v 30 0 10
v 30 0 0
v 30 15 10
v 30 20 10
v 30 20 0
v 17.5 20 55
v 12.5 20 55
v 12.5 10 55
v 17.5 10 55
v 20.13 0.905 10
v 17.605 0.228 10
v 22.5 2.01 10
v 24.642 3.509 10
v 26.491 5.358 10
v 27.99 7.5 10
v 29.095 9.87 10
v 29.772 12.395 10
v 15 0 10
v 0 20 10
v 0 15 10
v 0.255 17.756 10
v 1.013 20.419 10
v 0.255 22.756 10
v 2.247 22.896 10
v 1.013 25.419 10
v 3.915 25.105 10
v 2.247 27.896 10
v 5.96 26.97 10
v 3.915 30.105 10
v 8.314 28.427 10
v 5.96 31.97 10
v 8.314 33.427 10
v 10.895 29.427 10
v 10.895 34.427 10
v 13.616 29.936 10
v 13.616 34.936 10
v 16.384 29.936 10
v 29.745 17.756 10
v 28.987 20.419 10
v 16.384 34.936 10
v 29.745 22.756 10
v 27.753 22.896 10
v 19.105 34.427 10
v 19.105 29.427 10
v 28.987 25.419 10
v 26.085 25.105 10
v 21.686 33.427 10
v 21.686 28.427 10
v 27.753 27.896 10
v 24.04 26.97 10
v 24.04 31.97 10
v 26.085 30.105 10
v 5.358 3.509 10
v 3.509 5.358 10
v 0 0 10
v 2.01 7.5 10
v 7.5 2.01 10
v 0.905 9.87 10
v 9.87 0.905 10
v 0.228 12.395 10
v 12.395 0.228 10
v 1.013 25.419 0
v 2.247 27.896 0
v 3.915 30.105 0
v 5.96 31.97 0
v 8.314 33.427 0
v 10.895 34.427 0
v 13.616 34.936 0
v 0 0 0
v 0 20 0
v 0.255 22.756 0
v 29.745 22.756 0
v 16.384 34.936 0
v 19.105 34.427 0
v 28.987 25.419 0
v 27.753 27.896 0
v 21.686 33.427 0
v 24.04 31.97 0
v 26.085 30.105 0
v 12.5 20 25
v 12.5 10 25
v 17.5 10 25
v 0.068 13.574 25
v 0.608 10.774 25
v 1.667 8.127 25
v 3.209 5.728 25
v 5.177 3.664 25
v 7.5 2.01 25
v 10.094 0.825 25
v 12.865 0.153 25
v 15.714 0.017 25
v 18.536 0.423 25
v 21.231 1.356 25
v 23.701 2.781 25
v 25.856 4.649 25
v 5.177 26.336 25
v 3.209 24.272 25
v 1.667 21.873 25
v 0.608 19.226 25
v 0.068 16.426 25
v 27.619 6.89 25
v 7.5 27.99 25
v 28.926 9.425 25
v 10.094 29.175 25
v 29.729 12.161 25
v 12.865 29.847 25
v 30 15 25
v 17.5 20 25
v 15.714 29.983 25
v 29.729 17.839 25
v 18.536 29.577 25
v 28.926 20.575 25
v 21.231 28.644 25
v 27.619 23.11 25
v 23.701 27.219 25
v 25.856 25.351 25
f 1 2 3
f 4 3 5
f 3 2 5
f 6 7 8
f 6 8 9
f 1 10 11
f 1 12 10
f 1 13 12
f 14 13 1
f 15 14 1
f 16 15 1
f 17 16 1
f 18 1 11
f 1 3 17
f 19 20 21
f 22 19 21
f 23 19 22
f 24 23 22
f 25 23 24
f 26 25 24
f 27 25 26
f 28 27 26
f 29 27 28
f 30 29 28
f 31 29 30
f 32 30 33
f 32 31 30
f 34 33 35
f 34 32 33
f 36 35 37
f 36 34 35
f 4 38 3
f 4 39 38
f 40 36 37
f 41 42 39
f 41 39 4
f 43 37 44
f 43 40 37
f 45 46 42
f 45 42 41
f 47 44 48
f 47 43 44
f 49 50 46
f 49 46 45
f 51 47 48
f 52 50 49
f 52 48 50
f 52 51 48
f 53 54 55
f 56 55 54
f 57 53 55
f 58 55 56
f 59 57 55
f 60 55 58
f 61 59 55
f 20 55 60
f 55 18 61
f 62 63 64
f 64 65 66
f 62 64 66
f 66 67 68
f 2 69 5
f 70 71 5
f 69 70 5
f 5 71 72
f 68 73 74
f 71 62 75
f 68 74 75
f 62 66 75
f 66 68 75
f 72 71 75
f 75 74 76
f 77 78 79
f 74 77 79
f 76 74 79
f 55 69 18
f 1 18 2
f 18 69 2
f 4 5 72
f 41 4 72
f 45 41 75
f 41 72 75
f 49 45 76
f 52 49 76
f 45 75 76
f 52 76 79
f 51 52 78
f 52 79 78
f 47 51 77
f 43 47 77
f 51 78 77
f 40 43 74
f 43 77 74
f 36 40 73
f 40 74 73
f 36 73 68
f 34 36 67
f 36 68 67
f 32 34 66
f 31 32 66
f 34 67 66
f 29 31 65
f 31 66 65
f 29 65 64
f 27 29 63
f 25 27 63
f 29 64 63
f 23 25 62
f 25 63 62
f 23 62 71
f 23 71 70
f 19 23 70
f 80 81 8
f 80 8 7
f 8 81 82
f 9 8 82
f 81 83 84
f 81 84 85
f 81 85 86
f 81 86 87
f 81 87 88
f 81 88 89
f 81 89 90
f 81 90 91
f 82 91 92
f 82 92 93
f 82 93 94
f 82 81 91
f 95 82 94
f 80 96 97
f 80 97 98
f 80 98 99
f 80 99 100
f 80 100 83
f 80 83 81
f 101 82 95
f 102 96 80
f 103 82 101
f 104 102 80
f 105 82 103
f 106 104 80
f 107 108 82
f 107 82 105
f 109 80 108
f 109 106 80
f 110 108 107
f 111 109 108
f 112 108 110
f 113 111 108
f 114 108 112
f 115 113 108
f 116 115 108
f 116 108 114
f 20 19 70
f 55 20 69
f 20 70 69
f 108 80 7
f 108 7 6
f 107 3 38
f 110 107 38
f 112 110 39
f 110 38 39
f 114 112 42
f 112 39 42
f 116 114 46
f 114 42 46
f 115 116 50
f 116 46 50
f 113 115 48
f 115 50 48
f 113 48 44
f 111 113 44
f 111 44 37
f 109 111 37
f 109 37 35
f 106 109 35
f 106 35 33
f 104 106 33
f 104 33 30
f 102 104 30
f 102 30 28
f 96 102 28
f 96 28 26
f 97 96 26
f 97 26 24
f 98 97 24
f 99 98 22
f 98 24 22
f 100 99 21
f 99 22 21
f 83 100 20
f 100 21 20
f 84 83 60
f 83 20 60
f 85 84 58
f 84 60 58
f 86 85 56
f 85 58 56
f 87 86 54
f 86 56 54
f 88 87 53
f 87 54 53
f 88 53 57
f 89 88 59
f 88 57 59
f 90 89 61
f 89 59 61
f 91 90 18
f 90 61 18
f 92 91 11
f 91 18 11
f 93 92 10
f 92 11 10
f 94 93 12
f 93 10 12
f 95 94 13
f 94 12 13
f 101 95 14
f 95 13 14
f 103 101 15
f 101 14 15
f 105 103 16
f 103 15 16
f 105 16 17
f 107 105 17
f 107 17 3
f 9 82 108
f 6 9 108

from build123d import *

# Parameters (mm, degrees)
EXTRUDE_1_DEPTH = 10
SKETCH_2_R      = 15
EXTRUDE_2_DEPTH = 15
SKETCH_3_W      = 5
SKETCH_3_H      = 10
EXTRUDE_3_DEPTH = 30


with BuildPart() as part:
    # ｽｹｯﾁ1 → ﾎﾞｽ - 押し出し1 (new body)
    with BuildSketch(Plane.XY):
        with BuildLine():
            Line((0, 0), (30, 0))
            Line((30, 0), (30, 20))
            ThreePointArc((30, 20), (15, 35), (0, 20))
            Line((0, 20), (0, 0))
        make_face()
    extrude(amount=EXTRUDE_1_DEPTH)

    # ｽｹｯﾁ2 → ﾎﾞｽ - 押し出し2 (add)
    with BuildSketch(Plane.XY.offset(10)):
        with Locations((15, 15)):
            Circle(SKETCH_2_R)
    extrude(amount=EXTRUDE_2_DEPTH)

    # ｽｹｯﾁ3 → ﾎﾞｽ - 押し出し3 (add)
    with BuildSketch(Plane.XY.offset(25)):
        with Locations((15, 15)):
            Rectangle(SKETCH_3_W, SKETCH_3_H)
    extrude(amount=EXTRUDE_3_DEPTH)


solid = part.part
